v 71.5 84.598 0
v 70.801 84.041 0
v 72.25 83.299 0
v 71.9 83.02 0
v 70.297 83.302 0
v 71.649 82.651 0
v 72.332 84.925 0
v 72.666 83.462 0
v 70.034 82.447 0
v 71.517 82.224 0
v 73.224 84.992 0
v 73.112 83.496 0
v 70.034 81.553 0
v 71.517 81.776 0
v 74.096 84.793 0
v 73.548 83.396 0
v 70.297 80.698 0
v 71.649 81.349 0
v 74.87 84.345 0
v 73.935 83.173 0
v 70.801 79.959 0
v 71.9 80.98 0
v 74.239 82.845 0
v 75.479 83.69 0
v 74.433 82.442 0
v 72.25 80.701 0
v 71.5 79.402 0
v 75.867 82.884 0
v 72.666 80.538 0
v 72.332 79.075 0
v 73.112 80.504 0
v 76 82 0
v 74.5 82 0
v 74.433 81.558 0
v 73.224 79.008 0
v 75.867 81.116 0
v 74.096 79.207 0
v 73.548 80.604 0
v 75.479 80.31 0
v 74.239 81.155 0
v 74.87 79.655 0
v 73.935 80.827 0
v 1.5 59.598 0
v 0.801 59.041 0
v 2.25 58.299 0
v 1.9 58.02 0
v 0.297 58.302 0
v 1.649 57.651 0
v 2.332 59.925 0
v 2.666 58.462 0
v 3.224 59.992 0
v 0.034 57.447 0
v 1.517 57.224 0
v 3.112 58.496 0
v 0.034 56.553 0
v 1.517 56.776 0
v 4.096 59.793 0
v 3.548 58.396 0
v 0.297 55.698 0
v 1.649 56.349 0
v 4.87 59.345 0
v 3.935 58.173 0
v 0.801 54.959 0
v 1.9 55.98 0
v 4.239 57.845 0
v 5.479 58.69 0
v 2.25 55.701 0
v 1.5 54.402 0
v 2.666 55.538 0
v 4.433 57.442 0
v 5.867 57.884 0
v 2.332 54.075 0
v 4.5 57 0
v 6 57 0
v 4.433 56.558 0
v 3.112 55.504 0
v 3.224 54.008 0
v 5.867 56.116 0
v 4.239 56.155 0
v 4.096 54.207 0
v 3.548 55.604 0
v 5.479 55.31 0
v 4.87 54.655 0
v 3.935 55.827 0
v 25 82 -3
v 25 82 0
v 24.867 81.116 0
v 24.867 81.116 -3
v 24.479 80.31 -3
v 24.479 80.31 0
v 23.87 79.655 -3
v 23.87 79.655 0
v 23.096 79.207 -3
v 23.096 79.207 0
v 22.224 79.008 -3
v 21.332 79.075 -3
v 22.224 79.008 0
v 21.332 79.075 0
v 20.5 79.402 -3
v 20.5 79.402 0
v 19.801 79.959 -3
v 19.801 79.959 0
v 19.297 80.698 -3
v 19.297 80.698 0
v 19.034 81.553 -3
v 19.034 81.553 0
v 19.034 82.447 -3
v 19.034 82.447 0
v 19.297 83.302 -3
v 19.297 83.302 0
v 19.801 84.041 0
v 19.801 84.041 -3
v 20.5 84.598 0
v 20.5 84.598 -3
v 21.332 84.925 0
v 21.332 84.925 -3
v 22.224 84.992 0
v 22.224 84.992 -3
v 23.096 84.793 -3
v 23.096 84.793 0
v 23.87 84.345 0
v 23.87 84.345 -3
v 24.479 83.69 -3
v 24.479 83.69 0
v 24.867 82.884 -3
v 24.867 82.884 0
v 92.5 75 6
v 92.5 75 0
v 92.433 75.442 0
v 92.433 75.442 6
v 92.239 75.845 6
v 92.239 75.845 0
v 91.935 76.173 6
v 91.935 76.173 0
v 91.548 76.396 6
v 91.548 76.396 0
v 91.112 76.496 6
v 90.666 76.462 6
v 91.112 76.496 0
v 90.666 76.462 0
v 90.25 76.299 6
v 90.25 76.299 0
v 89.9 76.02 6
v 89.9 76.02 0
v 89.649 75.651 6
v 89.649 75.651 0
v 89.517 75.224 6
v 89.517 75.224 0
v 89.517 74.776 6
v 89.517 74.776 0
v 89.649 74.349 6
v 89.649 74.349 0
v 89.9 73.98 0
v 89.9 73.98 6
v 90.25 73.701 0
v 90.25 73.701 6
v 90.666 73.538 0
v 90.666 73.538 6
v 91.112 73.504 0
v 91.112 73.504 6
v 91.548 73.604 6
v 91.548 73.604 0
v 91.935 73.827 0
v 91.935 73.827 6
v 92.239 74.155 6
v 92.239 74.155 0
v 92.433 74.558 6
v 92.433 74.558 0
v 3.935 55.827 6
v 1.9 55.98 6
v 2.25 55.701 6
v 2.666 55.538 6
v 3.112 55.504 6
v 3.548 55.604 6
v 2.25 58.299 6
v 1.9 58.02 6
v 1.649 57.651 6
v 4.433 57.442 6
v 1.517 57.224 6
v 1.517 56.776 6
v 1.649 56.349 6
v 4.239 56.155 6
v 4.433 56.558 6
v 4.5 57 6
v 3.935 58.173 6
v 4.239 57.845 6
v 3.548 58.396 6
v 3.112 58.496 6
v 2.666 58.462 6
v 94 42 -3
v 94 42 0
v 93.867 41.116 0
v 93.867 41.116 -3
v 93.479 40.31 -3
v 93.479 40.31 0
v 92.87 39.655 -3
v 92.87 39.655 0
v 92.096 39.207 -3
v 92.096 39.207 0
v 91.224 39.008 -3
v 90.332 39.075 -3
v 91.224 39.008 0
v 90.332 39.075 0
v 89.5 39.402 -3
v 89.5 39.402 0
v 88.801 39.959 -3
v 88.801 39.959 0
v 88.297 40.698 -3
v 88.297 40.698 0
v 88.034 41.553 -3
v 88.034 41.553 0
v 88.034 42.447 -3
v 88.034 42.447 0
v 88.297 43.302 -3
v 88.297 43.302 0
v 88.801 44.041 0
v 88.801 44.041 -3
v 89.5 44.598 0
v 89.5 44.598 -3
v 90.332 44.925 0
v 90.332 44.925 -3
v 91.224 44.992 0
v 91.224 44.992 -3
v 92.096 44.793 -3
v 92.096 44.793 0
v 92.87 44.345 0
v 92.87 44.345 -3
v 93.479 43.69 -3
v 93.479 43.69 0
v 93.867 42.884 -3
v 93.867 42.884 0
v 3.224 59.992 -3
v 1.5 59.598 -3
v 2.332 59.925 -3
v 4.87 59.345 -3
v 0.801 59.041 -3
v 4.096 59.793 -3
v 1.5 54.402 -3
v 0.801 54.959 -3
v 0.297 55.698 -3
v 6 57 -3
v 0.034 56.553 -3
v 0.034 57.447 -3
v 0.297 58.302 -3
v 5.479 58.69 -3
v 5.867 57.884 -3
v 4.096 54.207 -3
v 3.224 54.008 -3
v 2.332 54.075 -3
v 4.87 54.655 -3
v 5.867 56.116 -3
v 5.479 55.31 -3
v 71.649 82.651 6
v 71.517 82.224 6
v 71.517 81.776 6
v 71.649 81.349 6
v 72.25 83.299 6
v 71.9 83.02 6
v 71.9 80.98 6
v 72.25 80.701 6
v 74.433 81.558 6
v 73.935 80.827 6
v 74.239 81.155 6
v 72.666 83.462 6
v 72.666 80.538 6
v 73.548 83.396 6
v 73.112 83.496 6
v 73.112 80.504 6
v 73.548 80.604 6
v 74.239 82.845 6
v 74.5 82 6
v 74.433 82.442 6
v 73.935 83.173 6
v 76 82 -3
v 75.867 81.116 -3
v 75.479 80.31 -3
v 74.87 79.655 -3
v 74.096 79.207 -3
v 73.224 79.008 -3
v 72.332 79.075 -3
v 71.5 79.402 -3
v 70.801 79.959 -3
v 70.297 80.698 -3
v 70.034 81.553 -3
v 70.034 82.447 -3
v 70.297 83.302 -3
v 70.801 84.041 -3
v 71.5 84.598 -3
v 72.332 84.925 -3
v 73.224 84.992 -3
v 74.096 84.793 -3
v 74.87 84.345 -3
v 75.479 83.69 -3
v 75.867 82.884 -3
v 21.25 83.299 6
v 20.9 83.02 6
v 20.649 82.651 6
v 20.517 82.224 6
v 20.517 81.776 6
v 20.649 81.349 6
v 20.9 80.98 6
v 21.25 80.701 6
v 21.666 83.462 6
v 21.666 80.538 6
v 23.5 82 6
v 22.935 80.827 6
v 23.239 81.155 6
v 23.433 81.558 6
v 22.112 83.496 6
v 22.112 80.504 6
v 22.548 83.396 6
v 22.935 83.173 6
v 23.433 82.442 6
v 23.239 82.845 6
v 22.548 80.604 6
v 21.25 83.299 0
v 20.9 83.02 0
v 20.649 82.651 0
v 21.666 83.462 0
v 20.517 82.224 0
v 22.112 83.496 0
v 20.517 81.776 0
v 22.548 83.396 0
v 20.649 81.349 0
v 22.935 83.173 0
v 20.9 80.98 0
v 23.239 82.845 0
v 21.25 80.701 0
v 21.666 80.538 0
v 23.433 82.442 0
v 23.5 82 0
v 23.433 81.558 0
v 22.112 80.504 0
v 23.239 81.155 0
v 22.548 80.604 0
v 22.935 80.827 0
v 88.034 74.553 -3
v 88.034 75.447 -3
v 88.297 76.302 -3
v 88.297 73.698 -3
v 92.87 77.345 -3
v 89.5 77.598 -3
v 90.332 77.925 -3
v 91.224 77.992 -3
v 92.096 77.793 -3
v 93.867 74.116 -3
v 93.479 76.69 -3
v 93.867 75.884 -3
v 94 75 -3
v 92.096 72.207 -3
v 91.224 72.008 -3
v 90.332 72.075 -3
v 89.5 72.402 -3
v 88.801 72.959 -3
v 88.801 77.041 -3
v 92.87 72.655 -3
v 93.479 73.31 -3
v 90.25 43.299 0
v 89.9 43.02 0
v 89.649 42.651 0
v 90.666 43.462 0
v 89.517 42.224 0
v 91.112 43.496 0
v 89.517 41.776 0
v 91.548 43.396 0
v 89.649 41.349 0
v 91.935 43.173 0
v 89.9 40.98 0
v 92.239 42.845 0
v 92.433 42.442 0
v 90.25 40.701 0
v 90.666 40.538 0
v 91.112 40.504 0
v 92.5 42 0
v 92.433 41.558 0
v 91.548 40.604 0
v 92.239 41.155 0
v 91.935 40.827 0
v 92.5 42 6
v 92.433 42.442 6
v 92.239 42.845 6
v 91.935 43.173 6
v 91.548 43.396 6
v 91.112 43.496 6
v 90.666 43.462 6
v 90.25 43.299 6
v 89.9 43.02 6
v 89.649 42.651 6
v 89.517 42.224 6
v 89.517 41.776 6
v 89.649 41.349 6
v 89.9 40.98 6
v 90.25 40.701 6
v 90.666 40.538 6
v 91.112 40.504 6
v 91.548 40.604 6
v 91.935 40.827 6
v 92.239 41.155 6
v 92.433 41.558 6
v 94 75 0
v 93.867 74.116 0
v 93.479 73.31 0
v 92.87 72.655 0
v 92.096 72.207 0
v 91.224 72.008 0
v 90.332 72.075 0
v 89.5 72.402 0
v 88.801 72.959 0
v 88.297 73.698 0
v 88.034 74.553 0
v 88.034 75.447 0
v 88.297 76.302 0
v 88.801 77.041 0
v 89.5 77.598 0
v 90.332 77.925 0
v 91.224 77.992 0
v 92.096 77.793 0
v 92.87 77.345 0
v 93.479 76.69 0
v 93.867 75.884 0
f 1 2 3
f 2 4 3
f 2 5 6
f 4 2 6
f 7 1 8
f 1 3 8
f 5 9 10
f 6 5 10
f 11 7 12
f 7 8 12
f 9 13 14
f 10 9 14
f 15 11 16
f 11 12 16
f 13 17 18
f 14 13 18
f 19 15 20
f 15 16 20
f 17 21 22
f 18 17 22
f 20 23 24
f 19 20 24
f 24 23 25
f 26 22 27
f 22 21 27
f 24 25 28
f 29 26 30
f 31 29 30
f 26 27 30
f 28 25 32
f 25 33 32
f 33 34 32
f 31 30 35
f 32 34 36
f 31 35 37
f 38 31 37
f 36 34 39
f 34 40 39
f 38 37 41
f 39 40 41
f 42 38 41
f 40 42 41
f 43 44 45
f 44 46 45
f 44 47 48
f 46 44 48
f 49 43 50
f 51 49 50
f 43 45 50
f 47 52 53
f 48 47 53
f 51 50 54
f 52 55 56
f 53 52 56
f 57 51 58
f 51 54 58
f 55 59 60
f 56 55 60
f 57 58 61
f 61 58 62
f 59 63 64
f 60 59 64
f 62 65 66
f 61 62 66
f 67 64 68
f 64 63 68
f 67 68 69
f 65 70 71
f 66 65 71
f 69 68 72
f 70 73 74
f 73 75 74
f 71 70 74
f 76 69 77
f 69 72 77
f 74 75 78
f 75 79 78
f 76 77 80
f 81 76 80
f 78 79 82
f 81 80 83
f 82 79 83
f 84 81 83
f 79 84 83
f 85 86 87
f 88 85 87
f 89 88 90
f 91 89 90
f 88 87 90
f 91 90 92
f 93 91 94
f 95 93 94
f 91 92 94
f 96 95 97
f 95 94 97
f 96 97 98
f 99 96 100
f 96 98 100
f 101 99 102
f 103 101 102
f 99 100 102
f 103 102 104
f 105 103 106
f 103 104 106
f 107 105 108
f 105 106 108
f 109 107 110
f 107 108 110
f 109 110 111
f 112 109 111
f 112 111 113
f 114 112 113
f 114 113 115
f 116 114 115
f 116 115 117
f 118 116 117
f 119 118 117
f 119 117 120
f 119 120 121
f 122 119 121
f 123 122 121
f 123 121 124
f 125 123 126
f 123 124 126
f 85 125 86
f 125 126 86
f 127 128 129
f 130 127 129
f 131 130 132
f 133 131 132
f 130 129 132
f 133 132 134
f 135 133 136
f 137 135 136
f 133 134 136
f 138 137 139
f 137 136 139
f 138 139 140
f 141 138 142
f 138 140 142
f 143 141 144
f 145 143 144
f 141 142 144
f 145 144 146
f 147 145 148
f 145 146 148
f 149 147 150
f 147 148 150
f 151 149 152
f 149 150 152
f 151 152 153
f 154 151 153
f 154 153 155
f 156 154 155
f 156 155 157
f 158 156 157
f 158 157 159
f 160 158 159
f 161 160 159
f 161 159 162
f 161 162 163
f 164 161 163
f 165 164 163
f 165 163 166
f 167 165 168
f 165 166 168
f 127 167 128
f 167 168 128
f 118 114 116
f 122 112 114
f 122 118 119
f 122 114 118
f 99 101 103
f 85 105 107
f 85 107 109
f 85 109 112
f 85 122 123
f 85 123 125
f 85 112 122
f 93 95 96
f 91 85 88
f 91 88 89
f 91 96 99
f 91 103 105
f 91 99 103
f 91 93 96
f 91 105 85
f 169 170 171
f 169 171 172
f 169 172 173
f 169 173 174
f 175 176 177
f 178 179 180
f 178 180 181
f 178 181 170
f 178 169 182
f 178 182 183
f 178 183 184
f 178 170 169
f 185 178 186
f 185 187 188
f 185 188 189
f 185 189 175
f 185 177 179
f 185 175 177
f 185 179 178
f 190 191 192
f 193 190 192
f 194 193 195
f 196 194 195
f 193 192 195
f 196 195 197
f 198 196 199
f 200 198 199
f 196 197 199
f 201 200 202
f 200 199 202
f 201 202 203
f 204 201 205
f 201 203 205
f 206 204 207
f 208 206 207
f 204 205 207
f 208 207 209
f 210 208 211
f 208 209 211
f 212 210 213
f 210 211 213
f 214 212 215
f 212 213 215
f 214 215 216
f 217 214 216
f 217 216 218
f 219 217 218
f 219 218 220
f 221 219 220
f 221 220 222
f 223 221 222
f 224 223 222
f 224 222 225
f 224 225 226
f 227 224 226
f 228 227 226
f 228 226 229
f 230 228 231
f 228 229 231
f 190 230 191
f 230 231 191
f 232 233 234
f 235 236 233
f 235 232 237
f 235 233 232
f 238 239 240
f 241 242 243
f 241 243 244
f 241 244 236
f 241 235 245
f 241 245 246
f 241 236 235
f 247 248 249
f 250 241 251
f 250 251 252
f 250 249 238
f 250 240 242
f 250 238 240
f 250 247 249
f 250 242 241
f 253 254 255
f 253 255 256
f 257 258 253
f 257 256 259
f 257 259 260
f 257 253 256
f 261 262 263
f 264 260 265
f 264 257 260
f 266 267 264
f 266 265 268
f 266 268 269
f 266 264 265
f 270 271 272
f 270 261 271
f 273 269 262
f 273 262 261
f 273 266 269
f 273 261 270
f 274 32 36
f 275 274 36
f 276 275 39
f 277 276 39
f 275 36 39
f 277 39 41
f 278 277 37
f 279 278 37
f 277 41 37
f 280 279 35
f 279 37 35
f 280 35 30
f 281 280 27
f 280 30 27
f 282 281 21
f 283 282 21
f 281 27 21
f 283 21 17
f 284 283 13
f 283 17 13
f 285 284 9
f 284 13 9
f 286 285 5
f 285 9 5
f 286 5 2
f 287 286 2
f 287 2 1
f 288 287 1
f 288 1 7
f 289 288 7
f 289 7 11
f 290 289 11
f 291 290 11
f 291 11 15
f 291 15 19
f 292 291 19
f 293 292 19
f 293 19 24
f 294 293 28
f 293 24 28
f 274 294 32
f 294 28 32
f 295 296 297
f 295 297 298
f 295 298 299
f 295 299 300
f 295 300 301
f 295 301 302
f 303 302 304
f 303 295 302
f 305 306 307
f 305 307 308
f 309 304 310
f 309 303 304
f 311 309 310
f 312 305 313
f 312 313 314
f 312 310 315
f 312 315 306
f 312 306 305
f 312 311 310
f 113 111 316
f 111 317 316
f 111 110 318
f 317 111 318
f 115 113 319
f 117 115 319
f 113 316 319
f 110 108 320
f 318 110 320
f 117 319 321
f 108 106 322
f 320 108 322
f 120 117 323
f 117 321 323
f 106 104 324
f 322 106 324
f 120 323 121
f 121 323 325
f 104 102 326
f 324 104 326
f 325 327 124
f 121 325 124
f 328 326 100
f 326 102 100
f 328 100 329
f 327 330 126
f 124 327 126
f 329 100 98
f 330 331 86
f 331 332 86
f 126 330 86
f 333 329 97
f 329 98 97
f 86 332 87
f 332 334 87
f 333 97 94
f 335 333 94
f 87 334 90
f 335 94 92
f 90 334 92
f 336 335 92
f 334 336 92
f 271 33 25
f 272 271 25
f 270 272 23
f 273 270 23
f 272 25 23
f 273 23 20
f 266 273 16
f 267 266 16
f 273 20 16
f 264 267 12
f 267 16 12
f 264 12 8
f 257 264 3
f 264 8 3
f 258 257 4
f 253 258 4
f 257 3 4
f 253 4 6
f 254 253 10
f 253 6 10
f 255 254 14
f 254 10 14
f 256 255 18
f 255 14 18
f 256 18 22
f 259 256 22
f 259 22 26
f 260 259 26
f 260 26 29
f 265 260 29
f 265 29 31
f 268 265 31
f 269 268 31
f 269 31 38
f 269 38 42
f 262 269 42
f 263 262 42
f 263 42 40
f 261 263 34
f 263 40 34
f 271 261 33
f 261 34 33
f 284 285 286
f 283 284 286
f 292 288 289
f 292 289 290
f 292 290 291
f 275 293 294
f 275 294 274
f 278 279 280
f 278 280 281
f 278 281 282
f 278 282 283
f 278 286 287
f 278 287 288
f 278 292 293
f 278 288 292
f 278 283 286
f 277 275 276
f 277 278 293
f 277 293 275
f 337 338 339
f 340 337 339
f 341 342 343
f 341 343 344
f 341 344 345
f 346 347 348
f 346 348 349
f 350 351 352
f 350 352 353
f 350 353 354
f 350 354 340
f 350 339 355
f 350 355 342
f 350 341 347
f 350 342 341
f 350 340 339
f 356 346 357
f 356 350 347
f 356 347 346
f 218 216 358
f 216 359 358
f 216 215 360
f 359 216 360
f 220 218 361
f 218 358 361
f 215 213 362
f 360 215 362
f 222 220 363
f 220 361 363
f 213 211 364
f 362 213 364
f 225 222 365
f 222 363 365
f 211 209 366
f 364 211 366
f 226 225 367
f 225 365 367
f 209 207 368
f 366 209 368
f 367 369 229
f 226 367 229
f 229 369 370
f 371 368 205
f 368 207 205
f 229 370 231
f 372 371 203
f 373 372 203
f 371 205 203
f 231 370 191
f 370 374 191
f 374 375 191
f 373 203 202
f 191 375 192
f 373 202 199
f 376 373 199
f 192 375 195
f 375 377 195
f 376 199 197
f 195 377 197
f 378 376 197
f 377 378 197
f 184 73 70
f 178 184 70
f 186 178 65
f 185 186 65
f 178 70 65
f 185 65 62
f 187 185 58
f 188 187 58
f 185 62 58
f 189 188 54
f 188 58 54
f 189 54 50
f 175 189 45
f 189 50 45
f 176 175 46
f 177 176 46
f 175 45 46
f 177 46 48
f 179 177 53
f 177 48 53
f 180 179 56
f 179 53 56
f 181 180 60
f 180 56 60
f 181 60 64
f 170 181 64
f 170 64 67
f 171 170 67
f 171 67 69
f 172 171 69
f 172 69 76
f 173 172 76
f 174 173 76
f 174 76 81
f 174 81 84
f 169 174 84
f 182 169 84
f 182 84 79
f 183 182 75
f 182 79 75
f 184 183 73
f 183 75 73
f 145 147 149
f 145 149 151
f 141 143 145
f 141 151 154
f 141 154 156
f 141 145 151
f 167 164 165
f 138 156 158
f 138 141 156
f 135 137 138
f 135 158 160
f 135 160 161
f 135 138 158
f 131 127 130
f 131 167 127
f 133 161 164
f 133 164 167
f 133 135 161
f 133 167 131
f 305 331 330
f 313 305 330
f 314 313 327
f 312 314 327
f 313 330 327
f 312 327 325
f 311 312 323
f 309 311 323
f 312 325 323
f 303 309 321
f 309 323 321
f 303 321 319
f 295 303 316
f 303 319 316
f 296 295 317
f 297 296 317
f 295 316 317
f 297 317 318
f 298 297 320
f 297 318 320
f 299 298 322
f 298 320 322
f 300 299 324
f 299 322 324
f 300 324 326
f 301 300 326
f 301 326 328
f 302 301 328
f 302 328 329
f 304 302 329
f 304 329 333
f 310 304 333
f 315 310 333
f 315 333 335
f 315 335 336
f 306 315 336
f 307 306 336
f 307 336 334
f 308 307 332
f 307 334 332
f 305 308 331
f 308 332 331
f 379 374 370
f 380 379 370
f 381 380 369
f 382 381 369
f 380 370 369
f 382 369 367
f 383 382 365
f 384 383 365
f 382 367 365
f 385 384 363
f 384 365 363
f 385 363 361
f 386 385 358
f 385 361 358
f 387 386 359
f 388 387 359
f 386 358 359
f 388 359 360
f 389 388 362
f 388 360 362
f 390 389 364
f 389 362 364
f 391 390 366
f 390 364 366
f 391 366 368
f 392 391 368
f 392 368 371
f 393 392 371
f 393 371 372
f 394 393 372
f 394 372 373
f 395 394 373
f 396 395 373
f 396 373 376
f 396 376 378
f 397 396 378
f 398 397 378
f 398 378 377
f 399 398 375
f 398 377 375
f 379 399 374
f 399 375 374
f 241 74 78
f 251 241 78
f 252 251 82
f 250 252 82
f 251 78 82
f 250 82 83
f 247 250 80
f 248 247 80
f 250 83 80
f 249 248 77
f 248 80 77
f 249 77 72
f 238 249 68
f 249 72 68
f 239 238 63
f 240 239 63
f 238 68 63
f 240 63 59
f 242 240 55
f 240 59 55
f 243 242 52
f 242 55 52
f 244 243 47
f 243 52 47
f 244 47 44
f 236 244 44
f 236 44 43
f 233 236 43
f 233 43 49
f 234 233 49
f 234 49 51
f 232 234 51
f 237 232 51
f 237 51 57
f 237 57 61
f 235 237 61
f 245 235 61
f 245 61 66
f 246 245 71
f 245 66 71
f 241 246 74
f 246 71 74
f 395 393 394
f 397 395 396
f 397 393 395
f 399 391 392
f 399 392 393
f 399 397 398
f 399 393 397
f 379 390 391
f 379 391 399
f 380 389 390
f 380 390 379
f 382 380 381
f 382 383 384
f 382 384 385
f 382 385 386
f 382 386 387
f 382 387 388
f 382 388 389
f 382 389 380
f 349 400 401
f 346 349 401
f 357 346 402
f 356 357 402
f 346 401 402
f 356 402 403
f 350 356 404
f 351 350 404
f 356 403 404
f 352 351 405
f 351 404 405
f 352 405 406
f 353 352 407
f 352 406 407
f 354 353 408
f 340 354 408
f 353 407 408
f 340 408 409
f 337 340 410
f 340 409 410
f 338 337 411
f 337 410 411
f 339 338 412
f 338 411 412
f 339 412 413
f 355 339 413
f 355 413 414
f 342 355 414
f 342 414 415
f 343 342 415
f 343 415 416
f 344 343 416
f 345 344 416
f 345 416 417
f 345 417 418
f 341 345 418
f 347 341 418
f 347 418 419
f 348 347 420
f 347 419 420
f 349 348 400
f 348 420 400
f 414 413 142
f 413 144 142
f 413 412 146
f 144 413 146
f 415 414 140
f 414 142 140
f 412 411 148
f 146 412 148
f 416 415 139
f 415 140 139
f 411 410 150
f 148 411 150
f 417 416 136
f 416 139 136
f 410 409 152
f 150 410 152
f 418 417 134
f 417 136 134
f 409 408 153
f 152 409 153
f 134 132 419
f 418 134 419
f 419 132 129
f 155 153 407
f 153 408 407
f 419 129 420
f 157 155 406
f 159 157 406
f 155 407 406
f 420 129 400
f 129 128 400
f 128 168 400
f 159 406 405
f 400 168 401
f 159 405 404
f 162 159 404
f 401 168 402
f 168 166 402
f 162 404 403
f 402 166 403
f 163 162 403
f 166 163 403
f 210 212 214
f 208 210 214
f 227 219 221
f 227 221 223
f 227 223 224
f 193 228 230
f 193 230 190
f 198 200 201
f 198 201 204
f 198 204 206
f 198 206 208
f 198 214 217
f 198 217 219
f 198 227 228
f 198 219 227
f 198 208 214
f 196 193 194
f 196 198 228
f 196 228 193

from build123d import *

# Parameters (mm, degrees)
SKETCH011_R             = 1.5
EXTRUDE_SKETCH011_DEPTH = 6
SKETCH010_R             = 3
EXTRUDE_SKETCH010_DEPTH = 3


with BuildPart() as sketch011_extrude:
    # Sketch011 → Extrude_Sketch011 (new body)
    with BuildSketch(Plane.XY):
        with Locations((3, 57)):
            Circle(SKETCH011_R)
        with Locations((22, 82)):
            Circle(SKETCH011_R)
        with Locations((73, 82)):
            Circle(SKETCH011_R)
        with Locations((91, 75)):
            Circle(SKETCH011_R)
        with Locations((91, 42)):
            Circle(SKETCH011_R)
    extrude(amount=EXTRUDE_SKETCH011_DEPTH)


with BuildPart() as m3_6mmscrews:
    # Sketch010 → Extrude_Sketch010 (new body)
    with BuildSketch(Plane(origin=(0, 0, 0), x_dir=(1, 0, 0), z_dir=(0, 0, -1))):
        with Locations((3, -57)):
            Circle(SKETCH010_R)
        with Locations((91, -42)):
            Circle(SKETCH010_R)
        with Locations((91, -75)):
            Circle(SKETCH010_R)
        with Locations((73, -82)):
            Circle(SKETCH010_R)
        with Locations((22, -82)):
            Circle(SKETCH010_R)
    extrude(amount=EXTRUDE_SKETCH010_DEPTH)

    # Fusion001003: union Sketch011_Extrude
    add(sketch011_extrude.part)


solid = m3_6mmscrews.part
